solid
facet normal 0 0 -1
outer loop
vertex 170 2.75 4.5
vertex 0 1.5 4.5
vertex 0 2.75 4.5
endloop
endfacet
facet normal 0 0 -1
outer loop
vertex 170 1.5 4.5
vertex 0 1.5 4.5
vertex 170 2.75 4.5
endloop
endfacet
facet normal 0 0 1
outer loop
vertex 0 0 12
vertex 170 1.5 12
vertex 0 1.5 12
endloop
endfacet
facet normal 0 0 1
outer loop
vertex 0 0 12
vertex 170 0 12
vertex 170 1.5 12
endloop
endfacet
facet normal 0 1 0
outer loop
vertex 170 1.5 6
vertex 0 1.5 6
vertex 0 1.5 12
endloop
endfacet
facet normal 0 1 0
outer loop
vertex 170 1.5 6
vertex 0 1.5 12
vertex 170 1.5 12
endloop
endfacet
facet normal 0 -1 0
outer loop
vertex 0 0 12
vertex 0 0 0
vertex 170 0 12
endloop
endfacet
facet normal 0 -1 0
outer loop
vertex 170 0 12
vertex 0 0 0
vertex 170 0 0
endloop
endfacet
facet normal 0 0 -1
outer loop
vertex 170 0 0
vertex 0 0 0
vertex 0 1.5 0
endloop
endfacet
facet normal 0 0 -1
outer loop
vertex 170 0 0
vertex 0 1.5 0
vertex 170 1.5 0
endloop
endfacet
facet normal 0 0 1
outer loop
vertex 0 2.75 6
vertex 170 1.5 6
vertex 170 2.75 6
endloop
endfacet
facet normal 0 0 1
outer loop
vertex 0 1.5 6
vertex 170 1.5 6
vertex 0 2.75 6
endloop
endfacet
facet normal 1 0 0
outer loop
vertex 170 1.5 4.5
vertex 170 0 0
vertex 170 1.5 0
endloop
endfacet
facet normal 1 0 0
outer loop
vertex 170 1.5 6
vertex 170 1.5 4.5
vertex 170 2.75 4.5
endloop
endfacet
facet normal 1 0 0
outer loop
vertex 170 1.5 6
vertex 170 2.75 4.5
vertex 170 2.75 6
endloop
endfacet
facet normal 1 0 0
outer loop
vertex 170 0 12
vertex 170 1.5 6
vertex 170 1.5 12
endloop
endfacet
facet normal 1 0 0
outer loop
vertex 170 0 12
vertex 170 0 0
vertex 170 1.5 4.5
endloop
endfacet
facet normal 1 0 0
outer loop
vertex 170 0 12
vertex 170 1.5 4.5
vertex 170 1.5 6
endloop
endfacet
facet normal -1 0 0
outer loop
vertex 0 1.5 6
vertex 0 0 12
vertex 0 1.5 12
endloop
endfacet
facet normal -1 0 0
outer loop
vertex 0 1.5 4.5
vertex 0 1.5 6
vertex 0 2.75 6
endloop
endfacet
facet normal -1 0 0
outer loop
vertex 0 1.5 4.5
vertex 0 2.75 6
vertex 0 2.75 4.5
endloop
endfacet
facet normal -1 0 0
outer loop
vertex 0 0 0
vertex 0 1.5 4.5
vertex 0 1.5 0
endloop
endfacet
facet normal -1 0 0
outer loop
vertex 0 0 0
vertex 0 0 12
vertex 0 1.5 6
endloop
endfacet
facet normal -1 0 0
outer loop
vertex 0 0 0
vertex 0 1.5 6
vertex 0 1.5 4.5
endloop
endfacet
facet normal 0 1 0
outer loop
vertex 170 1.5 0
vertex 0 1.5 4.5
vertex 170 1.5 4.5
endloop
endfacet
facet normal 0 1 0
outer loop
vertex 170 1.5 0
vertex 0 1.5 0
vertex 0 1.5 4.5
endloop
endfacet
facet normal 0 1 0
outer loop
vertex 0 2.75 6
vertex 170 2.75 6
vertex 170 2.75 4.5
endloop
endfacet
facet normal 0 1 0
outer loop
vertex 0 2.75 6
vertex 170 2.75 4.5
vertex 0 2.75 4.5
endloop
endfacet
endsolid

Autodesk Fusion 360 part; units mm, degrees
sketch "Sketch1" plane through (0, 0, 0) normal (0, 1, 0) x (1, 0, 0)
  line L0 (0, 0) -> (170, 0)
  line L1 (170, 0) -> (170, -12)
  line L2 (170, -12) -> (0, -12)
  line L3 (0, -12) -> (0, 0)
  dimension "d1" = 170
  dimension "d2" = 12
extrude "Extrude1" add sketch "Sketch1" along normal blind 1.5
sketch "Sketch2" plane through (0, 1.5, 0) normal (0, 1, 0) x (-1, 0, 0)
  line L0 (0, 12) -> (-170, 12)
  line L1 (-170, 12) -> (-170, 0)
  line L2 (-170, 0) -> (0, 0)
  line L3 (0, 0) -> (0, 12)
  line L4 (-170, 6) -> (0, 6)
  line L5 (0, 6) -> (0, 4.5)
  line L6 (0, 4.5) -> (-170, 4.5)
  line L7 (-170, 4.5) -> (-170, 6)
  dimension "d5" = 1.5
extrude "Extrude2" add sketch "Sketch2" along normal blind 1.25 contours L1 L3 L4 L5 L6 L7
equation "d1 = 125 mm + 40 mm + 5 mm"
